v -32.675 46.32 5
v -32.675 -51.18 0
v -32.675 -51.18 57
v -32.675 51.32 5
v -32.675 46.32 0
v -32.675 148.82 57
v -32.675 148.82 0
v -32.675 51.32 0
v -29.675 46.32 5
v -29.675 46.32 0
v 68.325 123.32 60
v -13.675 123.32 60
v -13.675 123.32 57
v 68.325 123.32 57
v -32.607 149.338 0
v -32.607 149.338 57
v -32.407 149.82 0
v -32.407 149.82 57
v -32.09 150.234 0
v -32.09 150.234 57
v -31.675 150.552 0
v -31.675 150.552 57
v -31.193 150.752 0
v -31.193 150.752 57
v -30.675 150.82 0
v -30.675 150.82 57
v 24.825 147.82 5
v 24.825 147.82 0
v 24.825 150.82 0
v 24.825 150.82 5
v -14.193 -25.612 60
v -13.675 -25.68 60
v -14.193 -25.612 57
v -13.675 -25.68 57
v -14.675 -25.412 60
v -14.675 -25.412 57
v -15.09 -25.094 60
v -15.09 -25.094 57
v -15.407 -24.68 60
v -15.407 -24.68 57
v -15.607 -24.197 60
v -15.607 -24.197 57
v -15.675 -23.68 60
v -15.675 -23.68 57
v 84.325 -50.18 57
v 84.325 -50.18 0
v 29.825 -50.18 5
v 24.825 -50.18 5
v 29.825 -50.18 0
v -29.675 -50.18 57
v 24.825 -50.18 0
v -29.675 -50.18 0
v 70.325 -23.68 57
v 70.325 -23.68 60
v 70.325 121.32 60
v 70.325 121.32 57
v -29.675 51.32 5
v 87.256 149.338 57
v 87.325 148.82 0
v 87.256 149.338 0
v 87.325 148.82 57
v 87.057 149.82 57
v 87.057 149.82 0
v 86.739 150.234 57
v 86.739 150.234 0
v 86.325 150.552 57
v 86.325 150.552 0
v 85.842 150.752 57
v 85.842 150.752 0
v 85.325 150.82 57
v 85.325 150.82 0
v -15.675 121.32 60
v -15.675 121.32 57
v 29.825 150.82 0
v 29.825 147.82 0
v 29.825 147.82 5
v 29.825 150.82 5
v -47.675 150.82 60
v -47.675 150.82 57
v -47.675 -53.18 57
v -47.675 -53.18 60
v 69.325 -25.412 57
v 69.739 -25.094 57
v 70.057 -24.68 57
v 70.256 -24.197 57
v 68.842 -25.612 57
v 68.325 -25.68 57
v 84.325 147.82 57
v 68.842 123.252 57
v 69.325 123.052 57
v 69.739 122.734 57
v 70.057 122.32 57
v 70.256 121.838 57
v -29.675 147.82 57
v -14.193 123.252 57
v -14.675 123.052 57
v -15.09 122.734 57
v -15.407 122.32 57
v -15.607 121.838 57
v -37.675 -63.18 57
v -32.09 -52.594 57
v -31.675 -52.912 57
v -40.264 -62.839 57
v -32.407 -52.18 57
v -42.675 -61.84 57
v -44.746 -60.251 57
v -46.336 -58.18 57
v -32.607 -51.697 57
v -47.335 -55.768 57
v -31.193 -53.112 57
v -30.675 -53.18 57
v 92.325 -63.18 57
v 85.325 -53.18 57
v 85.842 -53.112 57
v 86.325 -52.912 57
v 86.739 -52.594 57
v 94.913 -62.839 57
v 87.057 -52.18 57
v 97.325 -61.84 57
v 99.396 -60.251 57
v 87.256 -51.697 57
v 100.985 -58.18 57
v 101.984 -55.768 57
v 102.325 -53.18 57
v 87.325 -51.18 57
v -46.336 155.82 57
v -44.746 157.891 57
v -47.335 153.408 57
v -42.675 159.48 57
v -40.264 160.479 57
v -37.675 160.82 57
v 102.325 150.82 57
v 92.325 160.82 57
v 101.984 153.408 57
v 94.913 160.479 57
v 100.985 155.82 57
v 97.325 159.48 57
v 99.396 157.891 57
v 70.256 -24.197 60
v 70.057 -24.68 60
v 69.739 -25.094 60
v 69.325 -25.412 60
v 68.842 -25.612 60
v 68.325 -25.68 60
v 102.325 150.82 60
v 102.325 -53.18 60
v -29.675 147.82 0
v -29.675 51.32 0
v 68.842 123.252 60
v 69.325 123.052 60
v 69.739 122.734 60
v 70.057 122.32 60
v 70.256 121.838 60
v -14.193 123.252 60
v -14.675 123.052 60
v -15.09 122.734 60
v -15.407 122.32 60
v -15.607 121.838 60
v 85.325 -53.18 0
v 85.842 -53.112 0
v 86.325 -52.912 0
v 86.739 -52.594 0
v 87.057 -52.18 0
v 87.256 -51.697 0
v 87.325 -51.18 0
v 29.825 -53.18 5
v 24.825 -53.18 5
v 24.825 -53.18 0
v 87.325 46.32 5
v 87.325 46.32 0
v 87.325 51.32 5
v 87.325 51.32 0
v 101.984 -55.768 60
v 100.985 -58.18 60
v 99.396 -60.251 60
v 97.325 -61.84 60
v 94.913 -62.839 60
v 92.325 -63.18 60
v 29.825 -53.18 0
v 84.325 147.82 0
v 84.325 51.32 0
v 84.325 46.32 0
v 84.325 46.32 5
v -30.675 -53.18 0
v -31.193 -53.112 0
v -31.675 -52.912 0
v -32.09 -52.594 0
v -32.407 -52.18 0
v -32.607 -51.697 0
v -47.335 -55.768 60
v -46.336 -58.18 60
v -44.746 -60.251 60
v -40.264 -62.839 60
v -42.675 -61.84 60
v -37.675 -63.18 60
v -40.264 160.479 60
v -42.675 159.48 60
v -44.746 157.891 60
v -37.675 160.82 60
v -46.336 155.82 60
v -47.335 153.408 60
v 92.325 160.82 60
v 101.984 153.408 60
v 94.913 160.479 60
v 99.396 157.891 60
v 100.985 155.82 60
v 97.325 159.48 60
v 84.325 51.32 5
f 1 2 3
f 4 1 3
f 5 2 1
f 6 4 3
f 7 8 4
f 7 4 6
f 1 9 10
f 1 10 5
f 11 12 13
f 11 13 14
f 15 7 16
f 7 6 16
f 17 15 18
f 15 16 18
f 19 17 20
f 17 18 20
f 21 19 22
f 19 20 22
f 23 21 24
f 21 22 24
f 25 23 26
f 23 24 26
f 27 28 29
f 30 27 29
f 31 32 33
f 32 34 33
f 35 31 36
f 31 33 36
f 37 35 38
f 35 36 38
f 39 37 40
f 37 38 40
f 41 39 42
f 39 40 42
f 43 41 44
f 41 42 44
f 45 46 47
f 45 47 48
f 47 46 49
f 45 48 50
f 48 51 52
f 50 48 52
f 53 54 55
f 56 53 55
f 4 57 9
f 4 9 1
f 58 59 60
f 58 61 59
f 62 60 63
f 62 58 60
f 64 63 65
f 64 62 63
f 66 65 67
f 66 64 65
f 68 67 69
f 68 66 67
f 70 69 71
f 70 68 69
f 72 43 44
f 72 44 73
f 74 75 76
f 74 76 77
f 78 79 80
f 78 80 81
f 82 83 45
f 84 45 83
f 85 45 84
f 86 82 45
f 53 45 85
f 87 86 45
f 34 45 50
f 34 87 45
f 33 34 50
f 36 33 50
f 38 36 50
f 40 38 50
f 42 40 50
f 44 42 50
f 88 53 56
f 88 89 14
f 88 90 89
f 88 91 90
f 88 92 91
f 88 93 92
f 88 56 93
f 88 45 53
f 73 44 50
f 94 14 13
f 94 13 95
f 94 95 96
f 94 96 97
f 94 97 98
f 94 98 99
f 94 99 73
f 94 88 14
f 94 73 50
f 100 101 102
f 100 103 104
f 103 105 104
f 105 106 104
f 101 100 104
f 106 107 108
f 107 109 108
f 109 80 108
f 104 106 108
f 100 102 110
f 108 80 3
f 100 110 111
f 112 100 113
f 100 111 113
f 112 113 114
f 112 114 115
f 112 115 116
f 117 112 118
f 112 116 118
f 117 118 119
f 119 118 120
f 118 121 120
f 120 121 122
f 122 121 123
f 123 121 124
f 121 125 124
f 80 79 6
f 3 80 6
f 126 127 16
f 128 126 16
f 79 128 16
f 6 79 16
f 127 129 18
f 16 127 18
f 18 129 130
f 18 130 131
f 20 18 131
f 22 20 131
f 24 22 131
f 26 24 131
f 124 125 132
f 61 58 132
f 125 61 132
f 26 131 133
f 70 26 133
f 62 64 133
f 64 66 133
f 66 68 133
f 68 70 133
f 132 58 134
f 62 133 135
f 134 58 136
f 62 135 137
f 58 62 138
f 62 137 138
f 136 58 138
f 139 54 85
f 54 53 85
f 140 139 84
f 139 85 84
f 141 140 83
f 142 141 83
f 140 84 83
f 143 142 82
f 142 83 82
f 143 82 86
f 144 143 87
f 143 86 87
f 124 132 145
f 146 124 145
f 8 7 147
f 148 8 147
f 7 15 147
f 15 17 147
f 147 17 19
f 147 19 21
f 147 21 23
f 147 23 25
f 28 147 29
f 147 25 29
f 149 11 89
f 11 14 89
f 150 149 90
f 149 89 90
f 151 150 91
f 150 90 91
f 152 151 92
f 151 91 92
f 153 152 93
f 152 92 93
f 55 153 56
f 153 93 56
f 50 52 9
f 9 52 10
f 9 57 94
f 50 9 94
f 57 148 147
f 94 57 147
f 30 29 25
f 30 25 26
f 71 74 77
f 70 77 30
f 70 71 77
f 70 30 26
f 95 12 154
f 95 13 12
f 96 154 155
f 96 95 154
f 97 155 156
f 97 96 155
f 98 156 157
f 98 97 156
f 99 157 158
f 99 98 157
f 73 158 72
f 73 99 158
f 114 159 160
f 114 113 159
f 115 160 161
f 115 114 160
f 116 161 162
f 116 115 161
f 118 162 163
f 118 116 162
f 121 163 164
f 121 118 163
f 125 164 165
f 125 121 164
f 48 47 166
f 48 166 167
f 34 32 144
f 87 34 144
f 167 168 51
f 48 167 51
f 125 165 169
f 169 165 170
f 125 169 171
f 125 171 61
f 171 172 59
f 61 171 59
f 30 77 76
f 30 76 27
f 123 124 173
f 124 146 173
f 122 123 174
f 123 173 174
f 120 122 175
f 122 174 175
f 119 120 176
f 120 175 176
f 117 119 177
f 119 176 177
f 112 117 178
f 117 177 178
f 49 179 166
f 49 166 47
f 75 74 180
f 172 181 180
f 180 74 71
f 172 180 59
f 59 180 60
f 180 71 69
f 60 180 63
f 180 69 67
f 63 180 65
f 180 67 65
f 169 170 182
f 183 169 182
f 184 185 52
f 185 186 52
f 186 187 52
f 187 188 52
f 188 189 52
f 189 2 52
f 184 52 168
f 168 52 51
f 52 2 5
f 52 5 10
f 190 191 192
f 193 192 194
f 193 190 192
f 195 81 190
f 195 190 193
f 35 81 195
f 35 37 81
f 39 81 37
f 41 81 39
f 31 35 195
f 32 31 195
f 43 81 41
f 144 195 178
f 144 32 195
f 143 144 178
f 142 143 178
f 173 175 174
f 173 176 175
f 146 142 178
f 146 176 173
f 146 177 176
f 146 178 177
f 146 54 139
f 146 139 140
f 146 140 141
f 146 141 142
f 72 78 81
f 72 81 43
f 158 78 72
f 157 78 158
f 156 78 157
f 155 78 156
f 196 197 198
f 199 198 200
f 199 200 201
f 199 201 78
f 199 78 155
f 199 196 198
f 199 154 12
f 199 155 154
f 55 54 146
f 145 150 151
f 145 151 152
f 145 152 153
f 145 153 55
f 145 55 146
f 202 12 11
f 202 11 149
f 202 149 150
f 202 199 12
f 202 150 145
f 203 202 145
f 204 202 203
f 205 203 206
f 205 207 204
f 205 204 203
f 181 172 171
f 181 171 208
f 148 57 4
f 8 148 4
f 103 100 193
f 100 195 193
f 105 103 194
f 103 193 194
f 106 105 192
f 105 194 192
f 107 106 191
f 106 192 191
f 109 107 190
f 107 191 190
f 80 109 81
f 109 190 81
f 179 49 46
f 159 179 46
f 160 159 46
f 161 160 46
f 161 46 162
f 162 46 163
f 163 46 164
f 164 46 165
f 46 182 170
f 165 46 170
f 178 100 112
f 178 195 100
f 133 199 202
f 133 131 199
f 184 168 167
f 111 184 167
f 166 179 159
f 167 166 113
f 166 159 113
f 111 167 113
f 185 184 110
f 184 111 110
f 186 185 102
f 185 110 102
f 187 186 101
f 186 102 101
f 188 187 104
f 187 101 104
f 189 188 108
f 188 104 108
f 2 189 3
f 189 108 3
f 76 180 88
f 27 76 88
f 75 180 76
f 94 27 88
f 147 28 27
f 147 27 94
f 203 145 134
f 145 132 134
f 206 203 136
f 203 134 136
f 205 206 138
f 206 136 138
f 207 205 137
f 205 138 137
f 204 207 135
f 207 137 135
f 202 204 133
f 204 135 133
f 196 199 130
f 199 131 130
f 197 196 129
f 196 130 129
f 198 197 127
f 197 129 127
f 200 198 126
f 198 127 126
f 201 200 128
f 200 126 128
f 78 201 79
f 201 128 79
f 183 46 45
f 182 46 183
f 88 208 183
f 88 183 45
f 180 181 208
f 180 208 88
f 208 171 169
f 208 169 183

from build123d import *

# Parameters (mm, degrees)
ESBO_O1_W                = 120
ESBO_O1_H                = 204
RESSALTO_EXTRUS_O1_DEPTH = 60
ESBO_O2_W                = 114
ESBO_O2_H                = 198
CORTE_EXTRUS_O1_DEPTH    = 57
ESBO_O4_W                = 86
ESBO_O4_H                = 149
CORTE_EXTRUS_O2_DEPTH    = 45
ESBO_O7_W                = 3
ESBO_O7_H                = 204
RESSALTO_EXTRUS_O2_DEPTH = 15
ESBO_O12_W               = 3
ESBO_O12_H               = 204
RESSALTO_EXTRUS_O3_DEPTH = 15
ESBO_O13_W               = 150
ESBO_O13_H               = 3
RESSALTO_EXTRUS_O4_DEPTH = 10
ESBO_O14_W               = 150
ESBO_O14_H               = 3
RESSALTO_EXTRUS_O5_DEPTH = 10
FILETE1_R                = 10
ESBO_O15_W               = 3
ESBO_O15_H               = 5
ESBO_O15_W_2             = 5
ESBO_O15_H_2             = 3
CORTE_EXTRUS_O4_DEPTH    = 5
FILETE2_R                = 10
FILETE3_R                = 10
FILETE4_R                = 10
FILETE5_R                = 2
FILETE6_R                = 2
FILETE8_R                = 2


with BuildPart() as part:
    # Esboço1 → Ressalto-extrusão1 (new body)
    with BuildSketch(Plane.XY):
        with Locations((27.324641181, 48.820153307)):
            Rectangle(ESBO_O1_W, ESBO_O1_H)
    extrude(amount=RESSALTO_EXTRUS_O1_DEPTH)

    # Esboço2 → Corte-extrusão1 (cut)
    with BuildSketch(Plane(origin=(0, 0, 0), x_dir=(-1, 0, 0), z_dir=(0, 0, -1))):
        with Locations((-27.324641181, 48.820153307)):
            Rectangle(ESBO_O2_W, ESBO_O2_H)
    extrude(amount=-CORTE_EXTRUS_O1_DEPTH, mode=Mode.SUBTRACT)

    # Esboço4 → Corte-extrusão2 (cut)
    with BuildSketch(Plane.XY.offset(60)):
        with Locations((27.324641181, 48.820153307)):
            Rectangle(ESBO_O4_W, ESBO_O4_H)
    extrude(amount=-CORTE_EXTRUS_O2_DEPTH, mode=Mode.SUBTRACT)

    # Esboço7 → Ressalto-extrusão2 (add)
    with BuildSketch(Plane(origin=(87.324641181, 0, 0), x_dir=(0, 0, -1), z_dir=(1, 0, 0))):
        with Locations((-58.5, 48.820153307)):
            Rectangle(ESBO_O7_W, ESBO_O7_H)
    extrude(amount=RESSALTO_EXTRUS_O2_DEPTH)

    # Esboço12 → Ressalto-extrusão3 (add)
    with BuildSketch(Plane.ZY.offset(32.675358819)):
        with Locations((58.5, 48.820153307)):
            Rectangle(ESBO_O12_W, ESBO_O12_H)
    extrude(amount=RESSALTO_EXTRUS_O3_DEPTH)

    # Esboço13 → Ressalto-extrusão4 (add)
    with BuildSketch(Plane(origin=(0, 150.820153307, 0), x_dir=(1, 0, 0), z_dir=(0, 1, 0))):
        with Locations((27.324641181, -58.5)):
            Rectangle(ESBO_O13_W, ESBO_O13_H)
    extrude(amount=RESSALTO_EXTRUS_O4_DEPTH)

    # Esboço14 → Ressalto-extrusão5 (add)
    with BuildSketch(Plane.XZ.offset(53.179846693)):
        with Locations((27.324641181, 58.5)):
            Rectangle(ESBO_O14_W, ESBO_O14_H)
    extrude(amount=RESSALTO_EXTRUS_O5_DEPTH)

    # Filete1
    filete1_edges = [part.edges().sort_by_distance(p)[0] for p in [
        (102.324641181, 160.820153307, 58.5),
    ]]
    fillet(filete1_edges, radius=FILETE1_R)

    # Esboço15 → Corte-extrusão4 (cut)
    with BuildSketch(Plane(origin=(0, 0, 0), x_dir=(-1, 0, 0), z_dir=(0, 0, -1))):
        with Locations((31.175358819, 48.820153307)):
            Rectangle(ESBO_O15_W, ESBO_O15_H)
        with Locations((-27.324641181, 149.320153307)):
            Rectangle(ESBO_O15_W_2, ESBO_O15_H_2)
        with Locations((-27.324641181, -51.679846693)):
            Rectangle(ESBO_O15_W_2, ESBO_O15_H_2)
        with Locations((-85.824641181, 48.820153307)):
            Rectangle(ESBO_O15_W, ESBO_O15_H)
    extrude(amount=-CORTE_EXTRUS_O4_DEPTH, mode=Mode.SUBTRACT)

    # Filete2
    filete2_edges = [part.edges().sort_by_distance(p)[0] for p in [
        (-47.675358819, 160.820153307, 58.5),
    ]]
    fillet(filete2_edges, radius=FILETE2_R)

    # Filete3
    filete3_edges = [part.edges().sort_by_distance(p)[0] for p in [
        (102.324641181, -63.179846693, 58.5),
    ]]
    fillet(filete3_edges, radius=FILETE3_R)

    # Filete4
    filete4_edges = [part.edges().sort_by_distance(p)[0] for p in [
        (-47.675358819, -63.179846693, 58.5),
    ]]
    fillet(filete4_edges, radius=FILETE4_R)

    # Filete5
    filete5_edges = [part.edges().sort_by_distance(p)[0] for p in [
        (-32.675358819, -53.179846693, 28.5),
    ]]
    fillet(filete5_edges, radius=FILETE5_R)

    # Filete6
    filete6_edges = [part.edges().sort_by_distance(p)[0] for p in [
        (-32.675358819, 150.820153307, 28.5),
        (87.324641181, 150.820153307, 28.5),
        (87.324641181, -53.179846693, 28.5),
    ]]
    fillet(filete6_edges, radius=FILETE6_R)

    # Filete8
    filete8_edges = [part.edges().sort_by_distance(p)[0] for p in [
        (-15.675358819, 123.320153307, 58.5),
        (70.324641181, 123.320153307, 58.5),
        (70.324641181, -25.679846693, 58.5),
        (-15.675358819, -25.679846693, 58.5),
    ]]
    fillet(filete8_edges, radius=FILETE8_R)


solid = part.part
